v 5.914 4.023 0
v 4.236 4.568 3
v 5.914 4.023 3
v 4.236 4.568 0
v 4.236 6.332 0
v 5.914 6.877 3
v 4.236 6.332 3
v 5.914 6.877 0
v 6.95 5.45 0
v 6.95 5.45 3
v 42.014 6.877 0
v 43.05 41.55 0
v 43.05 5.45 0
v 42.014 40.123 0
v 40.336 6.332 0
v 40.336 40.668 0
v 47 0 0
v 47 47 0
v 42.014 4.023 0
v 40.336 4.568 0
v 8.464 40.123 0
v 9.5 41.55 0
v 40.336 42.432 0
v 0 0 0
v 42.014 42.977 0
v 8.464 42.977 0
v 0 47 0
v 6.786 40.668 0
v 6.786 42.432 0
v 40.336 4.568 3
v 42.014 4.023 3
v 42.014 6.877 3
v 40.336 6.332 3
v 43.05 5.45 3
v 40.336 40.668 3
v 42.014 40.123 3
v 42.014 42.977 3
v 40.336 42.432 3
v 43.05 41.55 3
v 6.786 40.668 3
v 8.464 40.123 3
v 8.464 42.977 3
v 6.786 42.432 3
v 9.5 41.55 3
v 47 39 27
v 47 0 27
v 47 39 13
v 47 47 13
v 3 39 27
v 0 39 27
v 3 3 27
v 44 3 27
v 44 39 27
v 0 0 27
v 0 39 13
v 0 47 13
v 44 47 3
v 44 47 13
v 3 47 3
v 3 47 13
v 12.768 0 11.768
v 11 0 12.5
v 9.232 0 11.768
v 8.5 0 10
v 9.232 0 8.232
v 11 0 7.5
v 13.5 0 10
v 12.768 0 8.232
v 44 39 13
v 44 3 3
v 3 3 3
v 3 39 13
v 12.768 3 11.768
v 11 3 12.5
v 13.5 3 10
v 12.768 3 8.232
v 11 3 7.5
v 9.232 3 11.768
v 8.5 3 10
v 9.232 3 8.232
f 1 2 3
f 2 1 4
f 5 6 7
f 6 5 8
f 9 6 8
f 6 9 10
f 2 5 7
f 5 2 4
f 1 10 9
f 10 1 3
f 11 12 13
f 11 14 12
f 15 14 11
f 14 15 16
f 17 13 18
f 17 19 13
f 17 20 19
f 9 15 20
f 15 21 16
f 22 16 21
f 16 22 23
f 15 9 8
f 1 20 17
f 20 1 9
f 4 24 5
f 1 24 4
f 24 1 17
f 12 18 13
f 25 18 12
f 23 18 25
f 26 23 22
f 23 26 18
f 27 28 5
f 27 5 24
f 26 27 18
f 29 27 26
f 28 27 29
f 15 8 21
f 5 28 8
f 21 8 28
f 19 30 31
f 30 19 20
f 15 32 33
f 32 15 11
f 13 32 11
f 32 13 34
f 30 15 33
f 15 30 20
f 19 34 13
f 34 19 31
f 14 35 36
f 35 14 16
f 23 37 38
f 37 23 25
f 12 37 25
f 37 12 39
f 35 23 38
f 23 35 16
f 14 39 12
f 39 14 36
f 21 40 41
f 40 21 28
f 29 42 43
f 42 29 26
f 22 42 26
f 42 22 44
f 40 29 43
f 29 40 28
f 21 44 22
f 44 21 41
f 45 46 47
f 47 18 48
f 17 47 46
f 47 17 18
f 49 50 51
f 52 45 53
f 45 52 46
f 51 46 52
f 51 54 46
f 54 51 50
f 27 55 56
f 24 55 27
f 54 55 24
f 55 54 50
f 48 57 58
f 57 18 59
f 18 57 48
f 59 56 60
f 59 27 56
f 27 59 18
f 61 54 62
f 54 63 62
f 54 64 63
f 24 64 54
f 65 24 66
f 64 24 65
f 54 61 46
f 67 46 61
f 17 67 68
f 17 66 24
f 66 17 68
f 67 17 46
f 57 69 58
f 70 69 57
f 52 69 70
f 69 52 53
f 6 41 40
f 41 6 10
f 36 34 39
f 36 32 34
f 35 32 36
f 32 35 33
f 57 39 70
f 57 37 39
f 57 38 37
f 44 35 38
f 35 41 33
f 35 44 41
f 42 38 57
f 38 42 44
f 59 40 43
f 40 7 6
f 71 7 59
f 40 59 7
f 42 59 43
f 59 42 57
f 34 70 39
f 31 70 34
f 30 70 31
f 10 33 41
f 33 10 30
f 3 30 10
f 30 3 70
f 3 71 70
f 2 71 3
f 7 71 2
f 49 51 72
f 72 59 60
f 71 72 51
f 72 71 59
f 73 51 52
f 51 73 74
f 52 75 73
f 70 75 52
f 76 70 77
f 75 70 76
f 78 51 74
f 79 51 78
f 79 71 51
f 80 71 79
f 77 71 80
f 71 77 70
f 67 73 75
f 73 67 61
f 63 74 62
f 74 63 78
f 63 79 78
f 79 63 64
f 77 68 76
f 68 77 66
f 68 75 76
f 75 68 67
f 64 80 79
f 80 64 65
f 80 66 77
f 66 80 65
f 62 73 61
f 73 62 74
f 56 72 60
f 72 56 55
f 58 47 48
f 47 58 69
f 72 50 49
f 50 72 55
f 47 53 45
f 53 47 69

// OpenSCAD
ibox = [41,41,21];
gbox = [3,3,3];
obox = ibox + gbox * 2;
dbox = [41,50,40];
r=8;
bottom_gap = 3;

//volume 7mm upa and 11mm along
//rear plugs 11.5 up and 12 for power plug
//sound jack (apposit volume) 9mm in
//electrolytic 17 high 16 in from fround  16.12 diam AND 2MM IN
//hole 3.1 (1/8) .9 + 3.1/2 = 2.45mm in
hin = 3.1/2 +.9 +3;

//2.81 + 3.1 / 2 from front   and 26.8 + 3.1/2 from front
//volume control 13 mm high

difference(){
    cube(obox);
    translate(gbox) cube(dbox);
    translate([11,10,7+bottom_gap])
        rotate([90,0,0])
            cylinder(r=2.5,h=20);
    for (i = [  [hin,hin,0],
                [obox[1]-hin,hin,0],
                [obox[1]-hin,obox[1]-hin,0],
                [r,obox[1]-hin,0]])
                    translate(i) cylinder(r=1.5,h=10);
    //slot from back 8mm deep
    translate([-5,obox[1]-8,13]) cube([obox[0]+10,obox[1]/3+1,obox[2]+1]);

}
    
